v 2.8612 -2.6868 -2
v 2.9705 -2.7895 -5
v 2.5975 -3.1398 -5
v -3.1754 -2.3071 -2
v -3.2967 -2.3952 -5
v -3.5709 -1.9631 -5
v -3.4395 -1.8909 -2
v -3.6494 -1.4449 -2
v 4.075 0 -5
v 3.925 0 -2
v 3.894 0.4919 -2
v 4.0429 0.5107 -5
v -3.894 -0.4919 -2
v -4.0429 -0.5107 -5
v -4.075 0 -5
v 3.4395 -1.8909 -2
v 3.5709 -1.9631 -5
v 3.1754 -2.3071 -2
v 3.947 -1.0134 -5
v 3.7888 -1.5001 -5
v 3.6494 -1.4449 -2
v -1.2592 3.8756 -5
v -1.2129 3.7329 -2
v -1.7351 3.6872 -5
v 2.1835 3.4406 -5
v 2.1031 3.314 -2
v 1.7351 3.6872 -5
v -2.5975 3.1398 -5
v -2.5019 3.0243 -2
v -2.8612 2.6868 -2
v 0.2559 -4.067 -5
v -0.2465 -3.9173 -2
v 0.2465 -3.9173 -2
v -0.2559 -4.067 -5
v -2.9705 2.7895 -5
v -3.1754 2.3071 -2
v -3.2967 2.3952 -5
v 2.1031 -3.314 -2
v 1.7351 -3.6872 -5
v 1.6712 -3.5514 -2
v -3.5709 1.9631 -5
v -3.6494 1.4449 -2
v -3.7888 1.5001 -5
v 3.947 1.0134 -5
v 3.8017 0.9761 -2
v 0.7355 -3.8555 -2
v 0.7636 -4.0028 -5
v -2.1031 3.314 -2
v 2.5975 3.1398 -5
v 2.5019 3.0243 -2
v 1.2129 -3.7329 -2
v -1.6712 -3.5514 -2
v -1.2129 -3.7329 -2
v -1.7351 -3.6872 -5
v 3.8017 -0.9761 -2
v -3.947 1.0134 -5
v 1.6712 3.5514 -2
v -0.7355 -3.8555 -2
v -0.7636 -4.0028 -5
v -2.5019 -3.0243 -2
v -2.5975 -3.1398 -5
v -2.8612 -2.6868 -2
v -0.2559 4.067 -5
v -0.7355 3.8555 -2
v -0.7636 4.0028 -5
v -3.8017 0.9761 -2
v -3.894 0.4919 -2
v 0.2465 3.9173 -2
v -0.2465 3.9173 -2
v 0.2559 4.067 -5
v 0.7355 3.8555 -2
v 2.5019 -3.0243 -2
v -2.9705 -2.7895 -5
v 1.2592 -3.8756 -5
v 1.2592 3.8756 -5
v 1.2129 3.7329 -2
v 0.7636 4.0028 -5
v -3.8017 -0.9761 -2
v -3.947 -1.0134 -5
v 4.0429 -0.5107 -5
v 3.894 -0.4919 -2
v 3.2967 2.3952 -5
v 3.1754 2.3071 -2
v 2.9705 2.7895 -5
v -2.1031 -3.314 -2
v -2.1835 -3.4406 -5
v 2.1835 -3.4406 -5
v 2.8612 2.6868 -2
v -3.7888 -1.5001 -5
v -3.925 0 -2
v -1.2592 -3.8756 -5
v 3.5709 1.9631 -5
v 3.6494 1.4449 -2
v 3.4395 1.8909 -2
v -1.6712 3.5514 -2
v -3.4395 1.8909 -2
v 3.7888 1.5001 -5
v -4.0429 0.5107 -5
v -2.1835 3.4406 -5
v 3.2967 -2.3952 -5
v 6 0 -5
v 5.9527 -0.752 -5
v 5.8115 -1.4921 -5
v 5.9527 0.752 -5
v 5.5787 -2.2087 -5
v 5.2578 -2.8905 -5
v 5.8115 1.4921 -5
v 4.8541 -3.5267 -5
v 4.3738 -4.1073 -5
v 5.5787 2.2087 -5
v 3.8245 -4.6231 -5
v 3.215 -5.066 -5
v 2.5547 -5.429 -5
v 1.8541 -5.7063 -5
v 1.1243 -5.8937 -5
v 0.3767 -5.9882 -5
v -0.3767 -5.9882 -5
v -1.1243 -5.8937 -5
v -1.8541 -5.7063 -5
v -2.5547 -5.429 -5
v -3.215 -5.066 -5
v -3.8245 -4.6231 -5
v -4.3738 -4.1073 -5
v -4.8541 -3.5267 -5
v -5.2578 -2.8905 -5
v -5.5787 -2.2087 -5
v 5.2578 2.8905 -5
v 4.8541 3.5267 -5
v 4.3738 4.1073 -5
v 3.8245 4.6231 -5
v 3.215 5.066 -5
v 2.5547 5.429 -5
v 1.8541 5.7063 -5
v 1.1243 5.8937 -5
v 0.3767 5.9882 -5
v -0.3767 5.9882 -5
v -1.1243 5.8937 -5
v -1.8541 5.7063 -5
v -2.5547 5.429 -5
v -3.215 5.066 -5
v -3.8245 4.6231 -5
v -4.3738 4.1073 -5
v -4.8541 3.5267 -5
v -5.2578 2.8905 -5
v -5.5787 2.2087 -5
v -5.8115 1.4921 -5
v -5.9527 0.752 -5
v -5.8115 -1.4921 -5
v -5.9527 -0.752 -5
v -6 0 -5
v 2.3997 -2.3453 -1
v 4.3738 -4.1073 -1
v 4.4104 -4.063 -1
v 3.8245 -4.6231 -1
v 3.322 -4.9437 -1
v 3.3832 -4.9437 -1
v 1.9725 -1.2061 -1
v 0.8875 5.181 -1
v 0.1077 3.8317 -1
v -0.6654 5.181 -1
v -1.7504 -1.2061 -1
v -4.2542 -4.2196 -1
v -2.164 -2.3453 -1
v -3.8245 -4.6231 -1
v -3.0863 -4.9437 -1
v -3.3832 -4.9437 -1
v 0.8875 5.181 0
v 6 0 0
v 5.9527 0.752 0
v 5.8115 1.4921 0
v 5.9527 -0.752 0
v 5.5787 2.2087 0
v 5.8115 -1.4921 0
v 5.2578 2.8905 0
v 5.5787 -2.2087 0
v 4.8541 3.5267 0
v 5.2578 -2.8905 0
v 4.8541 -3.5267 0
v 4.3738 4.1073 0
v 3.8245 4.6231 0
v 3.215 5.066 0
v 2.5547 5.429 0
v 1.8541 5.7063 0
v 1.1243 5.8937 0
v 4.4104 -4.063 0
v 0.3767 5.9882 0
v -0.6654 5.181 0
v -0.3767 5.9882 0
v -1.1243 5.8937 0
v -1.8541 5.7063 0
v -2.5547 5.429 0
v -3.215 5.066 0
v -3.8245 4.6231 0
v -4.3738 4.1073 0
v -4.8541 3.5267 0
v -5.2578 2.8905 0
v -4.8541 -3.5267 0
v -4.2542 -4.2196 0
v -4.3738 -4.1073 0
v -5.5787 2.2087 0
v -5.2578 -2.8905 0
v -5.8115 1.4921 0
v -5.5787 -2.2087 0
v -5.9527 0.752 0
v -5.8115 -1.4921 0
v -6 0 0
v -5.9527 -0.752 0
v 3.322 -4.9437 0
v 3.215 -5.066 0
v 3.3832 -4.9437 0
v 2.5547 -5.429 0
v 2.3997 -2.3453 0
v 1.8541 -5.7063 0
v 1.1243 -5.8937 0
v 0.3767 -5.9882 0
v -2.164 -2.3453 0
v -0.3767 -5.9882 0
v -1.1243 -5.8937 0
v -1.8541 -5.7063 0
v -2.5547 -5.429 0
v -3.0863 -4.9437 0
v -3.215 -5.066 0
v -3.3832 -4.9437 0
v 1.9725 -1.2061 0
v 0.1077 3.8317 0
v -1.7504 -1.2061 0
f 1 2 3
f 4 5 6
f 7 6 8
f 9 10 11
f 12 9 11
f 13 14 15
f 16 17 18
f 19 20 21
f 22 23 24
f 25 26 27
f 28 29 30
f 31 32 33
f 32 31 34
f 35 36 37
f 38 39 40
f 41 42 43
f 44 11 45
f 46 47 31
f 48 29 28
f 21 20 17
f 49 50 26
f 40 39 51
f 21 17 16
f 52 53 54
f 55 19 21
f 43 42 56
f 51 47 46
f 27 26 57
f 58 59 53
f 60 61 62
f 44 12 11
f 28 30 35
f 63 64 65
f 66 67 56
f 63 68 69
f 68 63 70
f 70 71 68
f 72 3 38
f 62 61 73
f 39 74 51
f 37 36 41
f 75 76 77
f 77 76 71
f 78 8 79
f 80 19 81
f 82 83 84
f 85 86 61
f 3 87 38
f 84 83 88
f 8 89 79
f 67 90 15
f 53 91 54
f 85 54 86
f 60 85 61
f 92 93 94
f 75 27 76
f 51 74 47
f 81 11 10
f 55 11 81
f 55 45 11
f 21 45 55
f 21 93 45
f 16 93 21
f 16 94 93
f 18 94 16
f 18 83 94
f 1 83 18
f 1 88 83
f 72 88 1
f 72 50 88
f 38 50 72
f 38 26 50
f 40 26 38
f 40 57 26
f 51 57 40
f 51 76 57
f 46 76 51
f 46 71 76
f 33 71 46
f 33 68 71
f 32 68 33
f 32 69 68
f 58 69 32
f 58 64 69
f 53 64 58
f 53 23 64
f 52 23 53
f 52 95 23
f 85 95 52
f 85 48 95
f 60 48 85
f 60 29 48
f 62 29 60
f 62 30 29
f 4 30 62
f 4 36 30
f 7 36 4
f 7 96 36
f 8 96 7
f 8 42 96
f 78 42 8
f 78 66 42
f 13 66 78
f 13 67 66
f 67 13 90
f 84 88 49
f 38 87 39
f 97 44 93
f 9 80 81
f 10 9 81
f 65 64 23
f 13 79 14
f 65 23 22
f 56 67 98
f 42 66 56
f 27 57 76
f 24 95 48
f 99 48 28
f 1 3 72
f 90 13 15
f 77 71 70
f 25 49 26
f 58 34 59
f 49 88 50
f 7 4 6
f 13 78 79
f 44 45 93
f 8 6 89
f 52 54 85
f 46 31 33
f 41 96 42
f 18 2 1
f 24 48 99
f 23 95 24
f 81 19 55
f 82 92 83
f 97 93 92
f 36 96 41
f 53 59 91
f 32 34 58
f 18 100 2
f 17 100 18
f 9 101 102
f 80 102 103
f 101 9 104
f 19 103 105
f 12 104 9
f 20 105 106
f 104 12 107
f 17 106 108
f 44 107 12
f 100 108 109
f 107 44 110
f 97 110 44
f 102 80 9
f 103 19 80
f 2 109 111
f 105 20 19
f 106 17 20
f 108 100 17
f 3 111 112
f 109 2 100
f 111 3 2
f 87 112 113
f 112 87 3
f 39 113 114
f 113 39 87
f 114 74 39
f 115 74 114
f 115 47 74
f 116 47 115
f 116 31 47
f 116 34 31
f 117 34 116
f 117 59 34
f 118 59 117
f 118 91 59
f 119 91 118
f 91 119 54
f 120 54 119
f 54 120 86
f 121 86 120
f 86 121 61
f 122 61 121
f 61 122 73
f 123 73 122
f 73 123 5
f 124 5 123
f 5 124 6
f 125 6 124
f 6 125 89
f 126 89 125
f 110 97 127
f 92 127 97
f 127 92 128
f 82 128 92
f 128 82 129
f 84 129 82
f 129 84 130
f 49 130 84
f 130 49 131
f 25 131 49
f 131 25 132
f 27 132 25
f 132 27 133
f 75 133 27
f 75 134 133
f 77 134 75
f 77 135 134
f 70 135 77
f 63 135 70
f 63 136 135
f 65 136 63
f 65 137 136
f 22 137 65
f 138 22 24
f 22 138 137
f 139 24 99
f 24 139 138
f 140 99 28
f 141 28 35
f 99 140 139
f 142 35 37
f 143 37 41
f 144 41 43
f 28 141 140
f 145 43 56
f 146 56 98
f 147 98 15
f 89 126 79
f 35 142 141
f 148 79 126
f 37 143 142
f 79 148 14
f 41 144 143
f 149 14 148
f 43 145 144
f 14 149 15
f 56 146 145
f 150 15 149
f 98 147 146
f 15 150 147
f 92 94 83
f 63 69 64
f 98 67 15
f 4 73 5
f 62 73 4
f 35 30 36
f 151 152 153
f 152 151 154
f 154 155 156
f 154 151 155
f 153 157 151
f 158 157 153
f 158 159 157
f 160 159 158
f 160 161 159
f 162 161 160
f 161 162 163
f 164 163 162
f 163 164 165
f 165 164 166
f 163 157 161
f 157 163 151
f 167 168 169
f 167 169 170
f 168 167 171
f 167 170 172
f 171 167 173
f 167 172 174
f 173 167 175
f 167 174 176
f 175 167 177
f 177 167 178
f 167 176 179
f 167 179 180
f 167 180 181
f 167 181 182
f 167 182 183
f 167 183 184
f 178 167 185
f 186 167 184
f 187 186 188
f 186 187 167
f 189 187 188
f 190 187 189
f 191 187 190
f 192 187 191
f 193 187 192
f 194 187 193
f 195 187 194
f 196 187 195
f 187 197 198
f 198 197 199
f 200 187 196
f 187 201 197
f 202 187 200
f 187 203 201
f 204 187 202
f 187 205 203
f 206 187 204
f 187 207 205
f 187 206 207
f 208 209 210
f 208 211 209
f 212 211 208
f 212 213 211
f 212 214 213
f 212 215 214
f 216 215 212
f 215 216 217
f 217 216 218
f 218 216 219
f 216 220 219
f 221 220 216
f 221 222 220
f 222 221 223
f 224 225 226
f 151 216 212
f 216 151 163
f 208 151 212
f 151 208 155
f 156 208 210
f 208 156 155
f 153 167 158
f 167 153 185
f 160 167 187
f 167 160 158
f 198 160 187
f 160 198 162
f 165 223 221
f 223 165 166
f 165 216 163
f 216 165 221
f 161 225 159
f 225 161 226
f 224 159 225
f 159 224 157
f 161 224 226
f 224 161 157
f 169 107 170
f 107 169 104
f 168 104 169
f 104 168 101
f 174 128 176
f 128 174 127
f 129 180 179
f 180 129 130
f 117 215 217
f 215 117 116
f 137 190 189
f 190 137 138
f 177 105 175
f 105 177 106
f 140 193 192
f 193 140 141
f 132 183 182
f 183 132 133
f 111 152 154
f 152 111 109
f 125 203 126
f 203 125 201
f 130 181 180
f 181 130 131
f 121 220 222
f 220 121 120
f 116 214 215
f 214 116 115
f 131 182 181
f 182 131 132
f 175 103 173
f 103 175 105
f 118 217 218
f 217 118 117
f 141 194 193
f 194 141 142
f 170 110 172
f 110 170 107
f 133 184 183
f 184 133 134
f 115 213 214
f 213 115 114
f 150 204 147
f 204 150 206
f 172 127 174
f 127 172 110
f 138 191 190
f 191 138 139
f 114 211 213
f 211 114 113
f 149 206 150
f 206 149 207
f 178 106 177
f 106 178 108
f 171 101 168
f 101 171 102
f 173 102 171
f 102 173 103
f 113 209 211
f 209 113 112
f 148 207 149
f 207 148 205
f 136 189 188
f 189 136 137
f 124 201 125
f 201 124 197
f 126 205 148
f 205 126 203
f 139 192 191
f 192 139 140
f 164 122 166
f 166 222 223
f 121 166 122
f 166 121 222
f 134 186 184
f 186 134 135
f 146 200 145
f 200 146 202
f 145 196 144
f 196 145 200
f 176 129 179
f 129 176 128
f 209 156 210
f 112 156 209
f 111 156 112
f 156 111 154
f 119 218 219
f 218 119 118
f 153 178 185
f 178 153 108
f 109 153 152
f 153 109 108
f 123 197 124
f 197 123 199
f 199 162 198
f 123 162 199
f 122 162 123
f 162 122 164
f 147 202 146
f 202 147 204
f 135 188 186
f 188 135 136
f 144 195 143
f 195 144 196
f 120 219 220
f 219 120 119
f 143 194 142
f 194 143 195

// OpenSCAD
$fn = 50;

difference() {
	union() {
		translate(v = [0, 0, -5.0]) {
			cylinder(h = 5, r = 6.0);
		}
	}
	union() {
		#translate(v = [0, 0, -5.0]) {
			cylinder(h = 3, r1 = 4.075, r2 = 3.925);
		}
		translate(v = [0, 0, -1]) {
			linear_extrude(height = 1) {
				text(font = "Impact", halign = "center", size = 10, text = "A", valign = "center");
			}
		}
	}
}
